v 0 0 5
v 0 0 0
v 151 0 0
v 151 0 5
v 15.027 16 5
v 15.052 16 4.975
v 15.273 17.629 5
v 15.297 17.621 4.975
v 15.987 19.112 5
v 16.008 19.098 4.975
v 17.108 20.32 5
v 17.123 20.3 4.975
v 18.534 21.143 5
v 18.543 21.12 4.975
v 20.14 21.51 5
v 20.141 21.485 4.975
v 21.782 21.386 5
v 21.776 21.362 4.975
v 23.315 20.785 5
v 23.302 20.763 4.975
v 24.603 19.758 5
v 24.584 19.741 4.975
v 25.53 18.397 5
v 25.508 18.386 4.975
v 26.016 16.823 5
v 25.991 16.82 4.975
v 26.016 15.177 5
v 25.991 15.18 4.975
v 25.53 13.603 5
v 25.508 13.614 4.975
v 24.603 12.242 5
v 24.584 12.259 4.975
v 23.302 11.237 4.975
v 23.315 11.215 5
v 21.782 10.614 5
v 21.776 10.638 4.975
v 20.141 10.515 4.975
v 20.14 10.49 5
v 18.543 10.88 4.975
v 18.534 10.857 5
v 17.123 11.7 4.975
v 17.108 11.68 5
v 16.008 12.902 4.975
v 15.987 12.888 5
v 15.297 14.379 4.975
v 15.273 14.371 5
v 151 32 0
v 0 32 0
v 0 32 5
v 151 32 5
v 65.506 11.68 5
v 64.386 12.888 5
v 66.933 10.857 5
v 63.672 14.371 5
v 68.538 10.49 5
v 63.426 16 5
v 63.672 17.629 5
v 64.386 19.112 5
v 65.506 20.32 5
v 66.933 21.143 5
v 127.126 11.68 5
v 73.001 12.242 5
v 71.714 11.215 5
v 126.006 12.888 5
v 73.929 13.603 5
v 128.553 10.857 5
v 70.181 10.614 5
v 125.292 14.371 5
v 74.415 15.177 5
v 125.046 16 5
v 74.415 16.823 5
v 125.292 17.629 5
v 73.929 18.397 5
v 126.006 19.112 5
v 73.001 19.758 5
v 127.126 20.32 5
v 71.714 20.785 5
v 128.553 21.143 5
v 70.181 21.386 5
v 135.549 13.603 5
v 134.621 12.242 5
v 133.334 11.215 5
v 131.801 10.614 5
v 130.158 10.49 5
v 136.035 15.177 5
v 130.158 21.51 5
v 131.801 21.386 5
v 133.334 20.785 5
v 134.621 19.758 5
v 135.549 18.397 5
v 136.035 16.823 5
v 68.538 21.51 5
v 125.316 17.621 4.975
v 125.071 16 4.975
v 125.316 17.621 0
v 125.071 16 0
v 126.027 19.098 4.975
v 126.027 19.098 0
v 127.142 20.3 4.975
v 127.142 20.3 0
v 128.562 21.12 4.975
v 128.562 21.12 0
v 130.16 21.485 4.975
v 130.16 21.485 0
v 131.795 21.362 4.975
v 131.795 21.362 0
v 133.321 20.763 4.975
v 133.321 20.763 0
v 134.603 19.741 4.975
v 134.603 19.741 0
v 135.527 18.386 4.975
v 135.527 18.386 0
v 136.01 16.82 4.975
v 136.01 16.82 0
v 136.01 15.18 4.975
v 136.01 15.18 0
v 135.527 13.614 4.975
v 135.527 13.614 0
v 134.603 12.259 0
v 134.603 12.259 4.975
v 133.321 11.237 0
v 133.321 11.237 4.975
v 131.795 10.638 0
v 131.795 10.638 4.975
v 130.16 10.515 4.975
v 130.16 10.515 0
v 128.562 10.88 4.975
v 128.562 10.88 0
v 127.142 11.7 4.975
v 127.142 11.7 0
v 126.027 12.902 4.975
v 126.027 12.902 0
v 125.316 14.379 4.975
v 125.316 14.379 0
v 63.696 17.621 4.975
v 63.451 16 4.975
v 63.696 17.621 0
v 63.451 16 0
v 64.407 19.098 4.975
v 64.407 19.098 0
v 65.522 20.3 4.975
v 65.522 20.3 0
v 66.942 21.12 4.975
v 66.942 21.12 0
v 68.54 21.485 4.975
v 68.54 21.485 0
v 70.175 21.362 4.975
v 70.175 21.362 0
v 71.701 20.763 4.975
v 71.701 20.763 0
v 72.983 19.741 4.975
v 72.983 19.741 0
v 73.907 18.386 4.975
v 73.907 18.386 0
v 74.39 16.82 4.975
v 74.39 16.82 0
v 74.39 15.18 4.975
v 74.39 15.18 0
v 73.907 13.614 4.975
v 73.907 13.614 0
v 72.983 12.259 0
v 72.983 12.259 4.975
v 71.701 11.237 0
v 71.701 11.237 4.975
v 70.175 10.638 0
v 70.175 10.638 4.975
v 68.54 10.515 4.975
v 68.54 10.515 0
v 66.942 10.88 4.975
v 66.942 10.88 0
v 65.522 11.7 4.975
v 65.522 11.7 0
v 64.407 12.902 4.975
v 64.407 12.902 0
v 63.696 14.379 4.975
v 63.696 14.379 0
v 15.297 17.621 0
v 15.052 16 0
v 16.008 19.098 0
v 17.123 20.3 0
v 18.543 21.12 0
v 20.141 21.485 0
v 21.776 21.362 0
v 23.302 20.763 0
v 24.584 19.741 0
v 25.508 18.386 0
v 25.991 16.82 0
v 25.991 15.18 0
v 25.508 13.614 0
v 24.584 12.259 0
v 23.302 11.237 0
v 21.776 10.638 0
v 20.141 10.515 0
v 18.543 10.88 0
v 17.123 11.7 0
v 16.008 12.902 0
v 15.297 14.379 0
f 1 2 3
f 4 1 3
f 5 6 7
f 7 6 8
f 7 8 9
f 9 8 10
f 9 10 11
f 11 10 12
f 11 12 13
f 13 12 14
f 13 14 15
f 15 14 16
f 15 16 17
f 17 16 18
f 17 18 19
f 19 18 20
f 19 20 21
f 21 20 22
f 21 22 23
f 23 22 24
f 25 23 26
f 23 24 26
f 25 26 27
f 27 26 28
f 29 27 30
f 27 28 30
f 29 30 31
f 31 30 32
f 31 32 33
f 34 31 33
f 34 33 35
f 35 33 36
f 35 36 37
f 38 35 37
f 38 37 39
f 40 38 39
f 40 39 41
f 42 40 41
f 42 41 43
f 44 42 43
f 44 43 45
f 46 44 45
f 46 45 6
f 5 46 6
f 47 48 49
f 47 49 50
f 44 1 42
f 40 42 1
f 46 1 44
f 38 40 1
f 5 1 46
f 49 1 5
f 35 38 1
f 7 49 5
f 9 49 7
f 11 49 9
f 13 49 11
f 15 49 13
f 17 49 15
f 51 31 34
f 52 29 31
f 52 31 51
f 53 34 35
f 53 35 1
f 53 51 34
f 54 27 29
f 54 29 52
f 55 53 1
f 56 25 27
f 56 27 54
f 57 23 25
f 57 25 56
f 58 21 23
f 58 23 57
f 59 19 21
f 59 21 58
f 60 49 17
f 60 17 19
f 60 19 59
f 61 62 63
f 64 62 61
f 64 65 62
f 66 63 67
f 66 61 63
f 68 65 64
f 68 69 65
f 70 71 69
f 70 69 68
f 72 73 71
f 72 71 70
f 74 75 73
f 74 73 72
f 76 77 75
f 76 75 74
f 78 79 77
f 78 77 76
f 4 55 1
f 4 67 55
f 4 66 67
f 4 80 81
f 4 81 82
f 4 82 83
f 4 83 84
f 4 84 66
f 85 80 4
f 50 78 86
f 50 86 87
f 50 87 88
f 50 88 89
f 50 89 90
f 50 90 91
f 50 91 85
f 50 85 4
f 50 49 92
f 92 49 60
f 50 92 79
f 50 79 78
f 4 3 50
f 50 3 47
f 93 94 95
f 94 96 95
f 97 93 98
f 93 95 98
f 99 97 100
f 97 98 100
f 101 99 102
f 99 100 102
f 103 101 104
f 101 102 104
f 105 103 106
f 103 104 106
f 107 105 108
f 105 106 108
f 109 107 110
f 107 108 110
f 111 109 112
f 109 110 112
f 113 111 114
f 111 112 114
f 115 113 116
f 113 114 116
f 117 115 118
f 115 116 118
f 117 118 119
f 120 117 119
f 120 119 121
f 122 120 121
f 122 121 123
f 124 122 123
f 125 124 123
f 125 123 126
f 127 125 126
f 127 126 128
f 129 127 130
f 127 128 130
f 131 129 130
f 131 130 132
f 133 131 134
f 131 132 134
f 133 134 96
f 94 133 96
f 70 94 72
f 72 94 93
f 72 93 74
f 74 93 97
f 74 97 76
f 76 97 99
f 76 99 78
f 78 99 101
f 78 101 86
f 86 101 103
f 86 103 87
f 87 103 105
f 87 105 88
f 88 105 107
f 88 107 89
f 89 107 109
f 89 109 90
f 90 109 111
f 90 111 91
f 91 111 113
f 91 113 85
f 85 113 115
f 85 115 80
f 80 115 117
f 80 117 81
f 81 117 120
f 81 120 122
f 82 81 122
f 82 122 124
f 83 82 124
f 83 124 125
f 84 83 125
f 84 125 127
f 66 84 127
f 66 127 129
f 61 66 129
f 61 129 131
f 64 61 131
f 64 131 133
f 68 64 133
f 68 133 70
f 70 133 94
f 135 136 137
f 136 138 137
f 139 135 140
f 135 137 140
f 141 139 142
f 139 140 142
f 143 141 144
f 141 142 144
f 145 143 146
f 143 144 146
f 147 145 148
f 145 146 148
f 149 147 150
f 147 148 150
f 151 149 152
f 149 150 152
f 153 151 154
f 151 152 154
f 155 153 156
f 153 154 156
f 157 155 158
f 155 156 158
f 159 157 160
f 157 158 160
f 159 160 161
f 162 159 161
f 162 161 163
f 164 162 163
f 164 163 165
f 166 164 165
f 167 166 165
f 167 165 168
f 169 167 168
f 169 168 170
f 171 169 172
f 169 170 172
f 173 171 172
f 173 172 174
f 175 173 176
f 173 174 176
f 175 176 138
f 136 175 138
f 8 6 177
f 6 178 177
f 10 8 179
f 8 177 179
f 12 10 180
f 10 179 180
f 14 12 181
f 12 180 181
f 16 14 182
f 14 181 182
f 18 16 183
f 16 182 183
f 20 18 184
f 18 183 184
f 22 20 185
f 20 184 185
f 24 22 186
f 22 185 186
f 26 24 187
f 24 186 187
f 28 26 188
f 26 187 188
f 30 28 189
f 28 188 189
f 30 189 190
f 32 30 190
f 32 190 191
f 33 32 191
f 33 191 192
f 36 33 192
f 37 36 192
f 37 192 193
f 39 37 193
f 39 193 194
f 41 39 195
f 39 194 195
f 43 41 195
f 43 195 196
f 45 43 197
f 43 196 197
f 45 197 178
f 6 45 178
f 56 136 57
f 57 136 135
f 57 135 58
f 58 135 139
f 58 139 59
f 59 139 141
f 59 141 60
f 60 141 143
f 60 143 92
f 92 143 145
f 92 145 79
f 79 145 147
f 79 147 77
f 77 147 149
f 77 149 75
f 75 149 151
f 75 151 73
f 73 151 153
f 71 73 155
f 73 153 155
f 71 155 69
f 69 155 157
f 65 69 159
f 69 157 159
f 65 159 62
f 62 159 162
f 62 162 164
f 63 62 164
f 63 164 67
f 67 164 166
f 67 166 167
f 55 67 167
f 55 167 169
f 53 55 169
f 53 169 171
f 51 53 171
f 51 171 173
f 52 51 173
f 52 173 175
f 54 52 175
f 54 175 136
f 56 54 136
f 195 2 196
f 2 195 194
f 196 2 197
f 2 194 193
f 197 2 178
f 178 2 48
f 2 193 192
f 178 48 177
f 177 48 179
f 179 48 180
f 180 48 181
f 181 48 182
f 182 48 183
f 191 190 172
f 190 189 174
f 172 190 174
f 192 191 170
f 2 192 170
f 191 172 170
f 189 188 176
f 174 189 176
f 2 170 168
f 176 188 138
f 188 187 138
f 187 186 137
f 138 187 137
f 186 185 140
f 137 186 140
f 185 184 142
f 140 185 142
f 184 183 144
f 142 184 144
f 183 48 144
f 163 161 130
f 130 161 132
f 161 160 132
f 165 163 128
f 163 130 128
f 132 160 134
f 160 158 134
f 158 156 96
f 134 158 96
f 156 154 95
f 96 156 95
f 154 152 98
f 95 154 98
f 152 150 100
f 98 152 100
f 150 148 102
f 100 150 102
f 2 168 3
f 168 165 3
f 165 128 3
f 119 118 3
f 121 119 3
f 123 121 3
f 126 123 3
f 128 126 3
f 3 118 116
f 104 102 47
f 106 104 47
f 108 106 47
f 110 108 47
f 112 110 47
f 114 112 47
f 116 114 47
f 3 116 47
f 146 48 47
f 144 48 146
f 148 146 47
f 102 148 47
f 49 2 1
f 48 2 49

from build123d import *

# Parameters (mm, degrees)
ESQUISSE1_W                 = 151
ESQUISSE1_H                 = 32
BOSS_EXTRU_1_DEPTH          = 5
D_GAGEMENT_M101_D           = 11
D_GAGEMENT_M101_DEPTH       = 37
D_GAGEMENT_M101_CSINK_D     = 11.05
D_GAGEMENT_M101_CSINK_ANGLE = 90
D_GAGEMENT_M101_TIP         = 3.304733405


with BuildPart() as part:
    # Esquisse1 → Boss.-Extru.1 (new body)
    with BuildSketch(Plane.XY):
        with Locations((75.5, 16)):
            Rectangle(ESQUISSE1_W, ESQUISSE1_H)
    extrude(amount=BOSS_EXTRU_1_DEPTH)

    # Dégagement M101
    with Locations(Plane(origin=(20.552465295, 16, 5), x_dir=(1, 0, 0), z_dir=(0, 0, 1))):
        with Locations((0, 0), (48.398815016, 0), (110.018769744, 0)):
            CounterSinkHole(D_GAGEMENT_M101_D / 2, D_GAGEMENT_M101_CSINK_D / 2, depth=D_GAGEMENT_M101_DEPTH, counter_sink_angle=D_GAGEMENT_M101_CSINK_ANGLE)
            with Locations((0, 0, -(D_GAGEMENT_M101_DEPTH + D_GAGEMENT_M101_TIP / 2))):  # 118° drill point
                Cone(0, D_GAGEMENT_M101_D / 2, D_GAGEMENT_M101_TIP, mode=Mode.SUBTRACT)


solid = part.part
